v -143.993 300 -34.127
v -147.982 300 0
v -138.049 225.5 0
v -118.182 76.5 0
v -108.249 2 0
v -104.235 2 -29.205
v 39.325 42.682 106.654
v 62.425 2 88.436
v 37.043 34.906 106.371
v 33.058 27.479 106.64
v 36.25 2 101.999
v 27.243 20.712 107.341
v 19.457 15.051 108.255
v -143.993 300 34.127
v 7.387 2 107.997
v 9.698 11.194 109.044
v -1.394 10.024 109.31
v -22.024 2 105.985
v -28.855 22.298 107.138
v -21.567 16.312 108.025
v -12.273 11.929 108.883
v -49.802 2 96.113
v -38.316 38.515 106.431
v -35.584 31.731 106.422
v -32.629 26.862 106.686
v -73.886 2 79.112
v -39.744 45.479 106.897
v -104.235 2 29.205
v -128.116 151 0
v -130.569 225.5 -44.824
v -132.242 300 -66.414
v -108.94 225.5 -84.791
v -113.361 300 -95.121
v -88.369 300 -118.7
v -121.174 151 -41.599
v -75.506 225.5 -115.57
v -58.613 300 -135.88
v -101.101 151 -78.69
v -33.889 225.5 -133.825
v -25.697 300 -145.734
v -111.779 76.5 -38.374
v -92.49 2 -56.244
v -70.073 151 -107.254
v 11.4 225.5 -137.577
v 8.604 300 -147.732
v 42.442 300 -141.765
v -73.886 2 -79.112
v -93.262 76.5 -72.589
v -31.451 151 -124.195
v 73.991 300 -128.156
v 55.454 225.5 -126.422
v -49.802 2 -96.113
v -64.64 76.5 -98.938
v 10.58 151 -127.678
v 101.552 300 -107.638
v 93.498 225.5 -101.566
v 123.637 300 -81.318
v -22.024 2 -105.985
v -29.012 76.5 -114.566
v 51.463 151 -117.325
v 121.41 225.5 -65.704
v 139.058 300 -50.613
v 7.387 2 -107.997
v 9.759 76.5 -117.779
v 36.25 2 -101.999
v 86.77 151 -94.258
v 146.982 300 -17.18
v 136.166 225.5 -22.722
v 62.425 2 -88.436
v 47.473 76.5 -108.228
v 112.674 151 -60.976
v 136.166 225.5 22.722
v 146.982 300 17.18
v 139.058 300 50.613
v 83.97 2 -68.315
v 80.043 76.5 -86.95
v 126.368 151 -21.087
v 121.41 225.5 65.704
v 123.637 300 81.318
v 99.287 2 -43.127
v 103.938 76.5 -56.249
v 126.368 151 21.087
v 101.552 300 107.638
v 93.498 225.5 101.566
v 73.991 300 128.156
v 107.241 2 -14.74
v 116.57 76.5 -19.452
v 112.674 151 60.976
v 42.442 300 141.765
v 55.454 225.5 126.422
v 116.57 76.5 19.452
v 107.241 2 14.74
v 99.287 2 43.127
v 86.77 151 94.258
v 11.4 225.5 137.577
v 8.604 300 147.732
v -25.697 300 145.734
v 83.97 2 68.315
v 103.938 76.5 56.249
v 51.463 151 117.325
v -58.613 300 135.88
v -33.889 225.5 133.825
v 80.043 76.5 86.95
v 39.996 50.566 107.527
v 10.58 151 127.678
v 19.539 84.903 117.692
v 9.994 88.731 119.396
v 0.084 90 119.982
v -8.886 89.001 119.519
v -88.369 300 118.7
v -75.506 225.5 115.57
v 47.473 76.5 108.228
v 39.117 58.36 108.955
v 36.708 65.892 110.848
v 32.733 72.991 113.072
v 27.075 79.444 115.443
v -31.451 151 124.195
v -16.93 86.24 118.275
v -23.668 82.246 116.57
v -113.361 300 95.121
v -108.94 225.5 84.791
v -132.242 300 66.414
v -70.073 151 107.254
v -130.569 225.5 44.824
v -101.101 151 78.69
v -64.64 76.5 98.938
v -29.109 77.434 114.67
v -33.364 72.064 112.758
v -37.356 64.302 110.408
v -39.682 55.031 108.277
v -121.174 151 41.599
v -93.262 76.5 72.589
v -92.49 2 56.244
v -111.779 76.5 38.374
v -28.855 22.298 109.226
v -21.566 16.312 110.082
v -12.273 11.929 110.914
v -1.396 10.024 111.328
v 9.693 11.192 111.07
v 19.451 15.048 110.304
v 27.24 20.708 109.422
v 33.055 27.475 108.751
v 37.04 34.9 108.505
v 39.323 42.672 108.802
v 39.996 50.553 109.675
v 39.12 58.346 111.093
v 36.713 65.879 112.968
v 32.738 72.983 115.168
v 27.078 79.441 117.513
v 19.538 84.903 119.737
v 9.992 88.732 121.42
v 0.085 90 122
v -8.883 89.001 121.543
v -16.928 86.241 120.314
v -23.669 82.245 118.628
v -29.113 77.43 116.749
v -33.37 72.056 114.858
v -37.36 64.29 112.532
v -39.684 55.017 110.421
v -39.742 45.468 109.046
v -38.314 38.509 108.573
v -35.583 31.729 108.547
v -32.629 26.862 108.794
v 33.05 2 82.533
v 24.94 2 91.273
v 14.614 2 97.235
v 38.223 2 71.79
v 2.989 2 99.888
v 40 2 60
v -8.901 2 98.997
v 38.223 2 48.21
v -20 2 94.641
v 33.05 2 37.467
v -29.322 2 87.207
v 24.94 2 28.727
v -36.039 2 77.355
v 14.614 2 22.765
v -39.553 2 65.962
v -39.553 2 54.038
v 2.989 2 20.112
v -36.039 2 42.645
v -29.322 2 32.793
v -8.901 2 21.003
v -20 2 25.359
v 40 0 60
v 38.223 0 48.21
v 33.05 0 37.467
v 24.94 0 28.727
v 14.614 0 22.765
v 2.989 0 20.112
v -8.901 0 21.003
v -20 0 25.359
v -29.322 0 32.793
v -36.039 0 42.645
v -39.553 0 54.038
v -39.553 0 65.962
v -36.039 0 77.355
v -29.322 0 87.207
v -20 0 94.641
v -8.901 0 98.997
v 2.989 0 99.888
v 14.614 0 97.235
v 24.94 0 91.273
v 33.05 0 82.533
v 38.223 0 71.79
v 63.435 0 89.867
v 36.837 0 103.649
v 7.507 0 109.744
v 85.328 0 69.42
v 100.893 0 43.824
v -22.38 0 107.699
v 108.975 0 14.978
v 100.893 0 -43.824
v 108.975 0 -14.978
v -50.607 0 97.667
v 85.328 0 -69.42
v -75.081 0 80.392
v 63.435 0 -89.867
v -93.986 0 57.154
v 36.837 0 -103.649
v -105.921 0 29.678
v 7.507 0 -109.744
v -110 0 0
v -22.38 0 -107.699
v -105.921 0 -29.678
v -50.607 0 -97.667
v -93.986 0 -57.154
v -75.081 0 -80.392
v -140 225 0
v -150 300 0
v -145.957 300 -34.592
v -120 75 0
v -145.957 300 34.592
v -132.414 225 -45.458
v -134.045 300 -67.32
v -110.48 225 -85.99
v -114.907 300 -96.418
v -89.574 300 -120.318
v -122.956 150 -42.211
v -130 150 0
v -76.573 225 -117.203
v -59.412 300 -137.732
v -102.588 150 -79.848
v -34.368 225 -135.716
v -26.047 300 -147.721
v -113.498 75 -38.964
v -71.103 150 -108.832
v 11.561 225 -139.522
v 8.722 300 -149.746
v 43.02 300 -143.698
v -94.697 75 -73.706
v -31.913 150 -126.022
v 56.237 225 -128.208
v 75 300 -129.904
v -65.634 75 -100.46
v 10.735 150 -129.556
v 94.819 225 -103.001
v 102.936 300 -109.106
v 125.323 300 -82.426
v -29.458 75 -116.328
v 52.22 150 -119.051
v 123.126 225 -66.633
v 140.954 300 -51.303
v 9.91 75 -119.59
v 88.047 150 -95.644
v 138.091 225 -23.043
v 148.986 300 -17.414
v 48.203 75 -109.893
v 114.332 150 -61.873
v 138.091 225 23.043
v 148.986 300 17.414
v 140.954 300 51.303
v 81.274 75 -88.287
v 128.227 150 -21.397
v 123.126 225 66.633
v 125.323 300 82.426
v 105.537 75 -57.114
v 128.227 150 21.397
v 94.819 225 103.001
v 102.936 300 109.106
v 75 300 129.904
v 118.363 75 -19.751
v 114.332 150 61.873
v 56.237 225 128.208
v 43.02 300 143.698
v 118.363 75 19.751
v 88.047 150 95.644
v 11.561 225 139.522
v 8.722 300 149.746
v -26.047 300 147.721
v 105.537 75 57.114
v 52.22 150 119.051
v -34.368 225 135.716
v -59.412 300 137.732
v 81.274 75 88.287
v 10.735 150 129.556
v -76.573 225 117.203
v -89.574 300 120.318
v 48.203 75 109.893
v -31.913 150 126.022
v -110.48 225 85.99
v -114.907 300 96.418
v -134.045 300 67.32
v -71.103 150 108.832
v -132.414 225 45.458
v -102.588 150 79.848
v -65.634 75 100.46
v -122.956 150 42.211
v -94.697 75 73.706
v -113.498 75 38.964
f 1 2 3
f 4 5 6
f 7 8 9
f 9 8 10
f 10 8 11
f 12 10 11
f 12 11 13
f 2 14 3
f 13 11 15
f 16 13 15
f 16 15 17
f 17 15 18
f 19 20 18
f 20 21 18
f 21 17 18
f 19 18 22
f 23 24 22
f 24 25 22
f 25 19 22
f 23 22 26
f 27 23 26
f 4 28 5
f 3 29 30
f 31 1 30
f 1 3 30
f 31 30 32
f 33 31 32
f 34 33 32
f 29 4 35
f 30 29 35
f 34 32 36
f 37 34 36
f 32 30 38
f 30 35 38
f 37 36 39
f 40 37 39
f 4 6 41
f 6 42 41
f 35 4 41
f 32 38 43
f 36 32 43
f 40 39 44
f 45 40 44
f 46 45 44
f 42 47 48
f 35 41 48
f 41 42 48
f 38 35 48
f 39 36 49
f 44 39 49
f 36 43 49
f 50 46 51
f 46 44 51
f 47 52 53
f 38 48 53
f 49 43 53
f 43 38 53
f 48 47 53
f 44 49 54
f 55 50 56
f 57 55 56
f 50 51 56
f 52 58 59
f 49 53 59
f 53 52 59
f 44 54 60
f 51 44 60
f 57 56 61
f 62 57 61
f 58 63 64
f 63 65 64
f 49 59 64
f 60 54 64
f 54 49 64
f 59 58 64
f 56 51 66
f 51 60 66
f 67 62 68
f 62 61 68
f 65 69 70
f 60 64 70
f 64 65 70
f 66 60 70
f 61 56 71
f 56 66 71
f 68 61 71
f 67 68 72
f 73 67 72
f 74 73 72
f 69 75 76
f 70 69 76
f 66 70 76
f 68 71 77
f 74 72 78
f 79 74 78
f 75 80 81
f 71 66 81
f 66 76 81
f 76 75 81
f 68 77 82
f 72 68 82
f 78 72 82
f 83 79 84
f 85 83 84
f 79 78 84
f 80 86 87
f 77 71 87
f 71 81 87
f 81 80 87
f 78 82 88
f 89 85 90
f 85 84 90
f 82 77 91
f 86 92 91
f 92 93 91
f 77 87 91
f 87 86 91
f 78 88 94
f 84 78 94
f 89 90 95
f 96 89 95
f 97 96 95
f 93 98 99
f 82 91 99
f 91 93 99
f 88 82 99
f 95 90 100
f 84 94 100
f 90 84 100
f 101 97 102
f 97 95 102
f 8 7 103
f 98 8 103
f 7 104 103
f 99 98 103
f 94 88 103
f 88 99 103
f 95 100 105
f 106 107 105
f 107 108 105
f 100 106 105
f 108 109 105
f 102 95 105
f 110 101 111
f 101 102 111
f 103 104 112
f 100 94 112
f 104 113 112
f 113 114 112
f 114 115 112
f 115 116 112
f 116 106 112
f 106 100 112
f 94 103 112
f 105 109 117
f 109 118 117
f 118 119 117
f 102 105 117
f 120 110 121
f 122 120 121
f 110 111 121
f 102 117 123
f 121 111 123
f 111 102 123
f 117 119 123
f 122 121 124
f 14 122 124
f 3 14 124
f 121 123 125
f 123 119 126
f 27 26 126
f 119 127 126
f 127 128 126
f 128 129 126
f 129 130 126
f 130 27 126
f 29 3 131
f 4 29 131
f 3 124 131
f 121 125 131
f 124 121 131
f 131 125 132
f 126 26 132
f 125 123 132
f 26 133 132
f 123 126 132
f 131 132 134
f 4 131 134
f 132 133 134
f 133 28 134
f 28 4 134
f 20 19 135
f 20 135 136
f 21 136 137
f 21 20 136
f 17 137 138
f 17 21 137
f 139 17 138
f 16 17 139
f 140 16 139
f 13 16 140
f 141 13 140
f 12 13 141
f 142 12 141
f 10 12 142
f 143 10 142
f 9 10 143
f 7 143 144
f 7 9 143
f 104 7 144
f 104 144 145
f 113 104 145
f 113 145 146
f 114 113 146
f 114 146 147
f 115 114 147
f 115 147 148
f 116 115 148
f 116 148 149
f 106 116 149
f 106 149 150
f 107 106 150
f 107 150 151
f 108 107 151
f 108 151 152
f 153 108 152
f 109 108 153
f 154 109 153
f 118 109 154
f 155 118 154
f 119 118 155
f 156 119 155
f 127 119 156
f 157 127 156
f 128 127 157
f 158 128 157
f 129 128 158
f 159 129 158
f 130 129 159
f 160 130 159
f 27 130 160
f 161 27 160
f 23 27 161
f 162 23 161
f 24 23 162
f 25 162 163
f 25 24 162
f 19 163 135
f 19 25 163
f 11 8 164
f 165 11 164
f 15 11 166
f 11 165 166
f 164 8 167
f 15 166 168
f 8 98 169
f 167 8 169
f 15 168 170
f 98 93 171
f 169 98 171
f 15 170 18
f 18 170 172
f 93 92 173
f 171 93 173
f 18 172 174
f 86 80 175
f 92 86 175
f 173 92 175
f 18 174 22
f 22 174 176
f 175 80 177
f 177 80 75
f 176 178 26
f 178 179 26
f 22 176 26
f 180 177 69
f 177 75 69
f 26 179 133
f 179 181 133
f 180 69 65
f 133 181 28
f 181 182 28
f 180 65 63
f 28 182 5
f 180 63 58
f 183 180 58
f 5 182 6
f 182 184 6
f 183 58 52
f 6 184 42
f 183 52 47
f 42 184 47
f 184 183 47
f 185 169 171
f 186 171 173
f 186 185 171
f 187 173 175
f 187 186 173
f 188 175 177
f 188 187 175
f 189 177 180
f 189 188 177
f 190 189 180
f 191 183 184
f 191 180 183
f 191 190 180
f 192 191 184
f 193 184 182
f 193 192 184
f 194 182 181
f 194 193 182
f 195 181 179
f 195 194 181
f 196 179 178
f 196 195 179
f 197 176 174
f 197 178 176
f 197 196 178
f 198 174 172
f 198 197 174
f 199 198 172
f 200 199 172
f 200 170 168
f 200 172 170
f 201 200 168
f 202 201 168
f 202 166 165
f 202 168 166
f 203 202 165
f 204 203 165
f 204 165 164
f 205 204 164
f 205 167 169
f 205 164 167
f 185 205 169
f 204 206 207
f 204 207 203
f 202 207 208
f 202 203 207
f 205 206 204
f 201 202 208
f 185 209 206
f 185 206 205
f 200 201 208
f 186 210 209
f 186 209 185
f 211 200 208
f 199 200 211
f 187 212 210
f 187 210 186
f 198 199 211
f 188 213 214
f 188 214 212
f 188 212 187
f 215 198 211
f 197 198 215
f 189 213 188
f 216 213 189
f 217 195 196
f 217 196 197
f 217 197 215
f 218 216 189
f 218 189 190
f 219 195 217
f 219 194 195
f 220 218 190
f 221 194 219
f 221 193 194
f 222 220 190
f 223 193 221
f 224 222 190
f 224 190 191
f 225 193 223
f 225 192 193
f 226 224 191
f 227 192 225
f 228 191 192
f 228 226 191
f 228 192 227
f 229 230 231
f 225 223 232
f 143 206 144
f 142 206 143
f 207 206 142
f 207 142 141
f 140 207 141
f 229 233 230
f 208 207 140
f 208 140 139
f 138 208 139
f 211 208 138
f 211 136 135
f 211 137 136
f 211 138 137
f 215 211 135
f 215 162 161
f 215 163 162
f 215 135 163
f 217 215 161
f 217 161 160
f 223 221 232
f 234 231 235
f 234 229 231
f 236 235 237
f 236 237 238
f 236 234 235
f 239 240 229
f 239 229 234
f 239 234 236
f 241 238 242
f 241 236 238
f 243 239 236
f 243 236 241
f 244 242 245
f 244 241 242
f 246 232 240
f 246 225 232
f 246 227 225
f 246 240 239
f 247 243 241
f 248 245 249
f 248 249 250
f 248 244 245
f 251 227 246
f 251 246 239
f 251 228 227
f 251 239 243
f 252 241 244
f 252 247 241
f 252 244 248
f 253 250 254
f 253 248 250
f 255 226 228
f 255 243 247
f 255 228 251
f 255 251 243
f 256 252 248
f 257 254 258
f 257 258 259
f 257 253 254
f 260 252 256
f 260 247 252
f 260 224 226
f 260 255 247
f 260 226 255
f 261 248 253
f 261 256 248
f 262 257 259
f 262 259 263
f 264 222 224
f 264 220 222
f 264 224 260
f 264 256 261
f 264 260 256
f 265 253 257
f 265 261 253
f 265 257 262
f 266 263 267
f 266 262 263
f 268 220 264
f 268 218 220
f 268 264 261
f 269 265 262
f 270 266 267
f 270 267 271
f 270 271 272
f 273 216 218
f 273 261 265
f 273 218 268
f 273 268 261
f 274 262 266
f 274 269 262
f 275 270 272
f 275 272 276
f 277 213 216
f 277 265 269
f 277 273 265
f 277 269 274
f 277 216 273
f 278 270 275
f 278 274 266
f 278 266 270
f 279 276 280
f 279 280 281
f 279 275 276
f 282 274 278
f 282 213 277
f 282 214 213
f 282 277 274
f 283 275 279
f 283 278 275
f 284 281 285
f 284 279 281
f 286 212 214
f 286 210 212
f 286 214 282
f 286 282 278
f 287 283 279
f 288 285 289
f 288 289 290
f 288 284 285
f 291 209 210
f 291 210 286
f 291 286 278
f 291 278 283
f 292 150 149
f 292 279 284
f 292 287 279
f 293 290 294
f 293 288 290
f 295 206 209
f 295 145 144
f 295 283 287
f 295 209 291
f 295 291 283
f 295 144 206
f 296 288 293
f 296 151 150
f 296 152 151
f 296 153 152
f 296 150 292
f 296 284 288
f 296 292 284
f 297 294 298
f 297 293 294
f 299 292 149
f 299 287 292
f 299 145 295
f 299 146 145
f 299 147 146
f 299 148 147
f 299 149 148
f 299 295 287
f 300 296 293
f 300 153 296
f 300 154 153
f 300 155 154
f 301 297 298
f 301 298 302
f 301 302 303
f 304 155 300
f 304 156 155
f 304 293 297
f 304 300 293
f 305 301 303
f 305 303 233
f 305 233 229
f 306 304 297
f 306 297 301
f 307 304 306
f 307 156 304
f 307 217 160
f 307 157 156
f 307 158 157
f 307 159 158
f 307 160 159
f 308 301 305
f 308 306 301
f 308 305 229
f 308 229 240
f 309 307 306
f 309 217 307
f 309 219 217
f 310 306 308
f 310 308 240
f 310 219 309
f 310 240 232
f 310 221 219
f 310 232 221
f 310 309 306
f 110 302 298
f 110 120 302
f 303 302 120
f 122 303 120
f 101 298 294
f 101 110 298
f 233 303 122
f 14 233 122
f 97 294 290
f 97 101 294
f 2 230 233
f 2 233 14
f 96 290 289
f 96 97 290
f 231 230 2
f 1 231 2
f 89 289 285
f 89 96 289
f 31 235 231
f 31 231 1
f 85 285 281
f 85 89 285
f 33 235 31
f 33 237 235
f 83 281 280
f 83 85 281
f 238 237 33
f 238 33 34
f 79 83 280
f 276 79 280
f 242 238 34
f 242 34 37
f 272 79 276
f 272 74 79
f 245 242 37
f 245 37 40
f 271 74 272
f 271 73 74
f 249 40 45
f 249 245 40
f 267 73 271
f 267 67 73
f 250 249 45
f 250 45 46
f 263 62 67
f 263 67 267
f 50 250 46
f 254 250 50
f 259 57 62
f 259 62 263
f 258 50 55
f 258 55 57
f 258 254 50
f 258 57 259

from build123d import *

# Parameters (mm, degrees)
SHELL_1_T           = -2
SKETCH_2_R          = 40
CUT_EXTRUDE_1_DEPTH = 368.423461417
SKETCH_3_R          = 40
CUT_EXTRUDE_7_DEPTH = 10


with BuildPart() as part:
    # 草圖1 → 旋轉1 (revolve)
    with BuildSketch(Plane.XY):
        Polygon((-150, 300), (-110, 0), (0, 0), (0, 300), align=None)
    revolve(axis=Axis((0, 300, 0), (0, -1, 0)))

    # 薄殼1
    shell_1_openings = [part.faces().sort_by_distance(p)[0] for p in [
        (0, 300, 0),
    ]]
    offset(amount=SHELL_1_T, openings=shell_1_openings, kind=Kind.INTERSECTION)

    # 草圖2 → 除料-伸長1 (cut, through all)
    with BuildSketch(Plane.XY):
        with Locations(Location((0, 50, 0), (0, 0, 223.831442038))):
            Circle(SKETCH_2_R)
    extrude(amount=CUT_EXTRUDE_1_DEPTH, mode=Mode.SUBTRACT)

    # 草圖3 → 除料-伸長7 (cut)
    with BuildSketch(Plane(origin=(0, 0, 0), x_dir=(1, 0, 0), z_dir=(0, 1, 0))):
        with Locations((0, -60)):
            Circle(SKETCH_3_R)
    extrude(amount=CUT_EXTRUDE_7_DEPTH, mode=Mode.SUBTRACT)


solid = part.part
